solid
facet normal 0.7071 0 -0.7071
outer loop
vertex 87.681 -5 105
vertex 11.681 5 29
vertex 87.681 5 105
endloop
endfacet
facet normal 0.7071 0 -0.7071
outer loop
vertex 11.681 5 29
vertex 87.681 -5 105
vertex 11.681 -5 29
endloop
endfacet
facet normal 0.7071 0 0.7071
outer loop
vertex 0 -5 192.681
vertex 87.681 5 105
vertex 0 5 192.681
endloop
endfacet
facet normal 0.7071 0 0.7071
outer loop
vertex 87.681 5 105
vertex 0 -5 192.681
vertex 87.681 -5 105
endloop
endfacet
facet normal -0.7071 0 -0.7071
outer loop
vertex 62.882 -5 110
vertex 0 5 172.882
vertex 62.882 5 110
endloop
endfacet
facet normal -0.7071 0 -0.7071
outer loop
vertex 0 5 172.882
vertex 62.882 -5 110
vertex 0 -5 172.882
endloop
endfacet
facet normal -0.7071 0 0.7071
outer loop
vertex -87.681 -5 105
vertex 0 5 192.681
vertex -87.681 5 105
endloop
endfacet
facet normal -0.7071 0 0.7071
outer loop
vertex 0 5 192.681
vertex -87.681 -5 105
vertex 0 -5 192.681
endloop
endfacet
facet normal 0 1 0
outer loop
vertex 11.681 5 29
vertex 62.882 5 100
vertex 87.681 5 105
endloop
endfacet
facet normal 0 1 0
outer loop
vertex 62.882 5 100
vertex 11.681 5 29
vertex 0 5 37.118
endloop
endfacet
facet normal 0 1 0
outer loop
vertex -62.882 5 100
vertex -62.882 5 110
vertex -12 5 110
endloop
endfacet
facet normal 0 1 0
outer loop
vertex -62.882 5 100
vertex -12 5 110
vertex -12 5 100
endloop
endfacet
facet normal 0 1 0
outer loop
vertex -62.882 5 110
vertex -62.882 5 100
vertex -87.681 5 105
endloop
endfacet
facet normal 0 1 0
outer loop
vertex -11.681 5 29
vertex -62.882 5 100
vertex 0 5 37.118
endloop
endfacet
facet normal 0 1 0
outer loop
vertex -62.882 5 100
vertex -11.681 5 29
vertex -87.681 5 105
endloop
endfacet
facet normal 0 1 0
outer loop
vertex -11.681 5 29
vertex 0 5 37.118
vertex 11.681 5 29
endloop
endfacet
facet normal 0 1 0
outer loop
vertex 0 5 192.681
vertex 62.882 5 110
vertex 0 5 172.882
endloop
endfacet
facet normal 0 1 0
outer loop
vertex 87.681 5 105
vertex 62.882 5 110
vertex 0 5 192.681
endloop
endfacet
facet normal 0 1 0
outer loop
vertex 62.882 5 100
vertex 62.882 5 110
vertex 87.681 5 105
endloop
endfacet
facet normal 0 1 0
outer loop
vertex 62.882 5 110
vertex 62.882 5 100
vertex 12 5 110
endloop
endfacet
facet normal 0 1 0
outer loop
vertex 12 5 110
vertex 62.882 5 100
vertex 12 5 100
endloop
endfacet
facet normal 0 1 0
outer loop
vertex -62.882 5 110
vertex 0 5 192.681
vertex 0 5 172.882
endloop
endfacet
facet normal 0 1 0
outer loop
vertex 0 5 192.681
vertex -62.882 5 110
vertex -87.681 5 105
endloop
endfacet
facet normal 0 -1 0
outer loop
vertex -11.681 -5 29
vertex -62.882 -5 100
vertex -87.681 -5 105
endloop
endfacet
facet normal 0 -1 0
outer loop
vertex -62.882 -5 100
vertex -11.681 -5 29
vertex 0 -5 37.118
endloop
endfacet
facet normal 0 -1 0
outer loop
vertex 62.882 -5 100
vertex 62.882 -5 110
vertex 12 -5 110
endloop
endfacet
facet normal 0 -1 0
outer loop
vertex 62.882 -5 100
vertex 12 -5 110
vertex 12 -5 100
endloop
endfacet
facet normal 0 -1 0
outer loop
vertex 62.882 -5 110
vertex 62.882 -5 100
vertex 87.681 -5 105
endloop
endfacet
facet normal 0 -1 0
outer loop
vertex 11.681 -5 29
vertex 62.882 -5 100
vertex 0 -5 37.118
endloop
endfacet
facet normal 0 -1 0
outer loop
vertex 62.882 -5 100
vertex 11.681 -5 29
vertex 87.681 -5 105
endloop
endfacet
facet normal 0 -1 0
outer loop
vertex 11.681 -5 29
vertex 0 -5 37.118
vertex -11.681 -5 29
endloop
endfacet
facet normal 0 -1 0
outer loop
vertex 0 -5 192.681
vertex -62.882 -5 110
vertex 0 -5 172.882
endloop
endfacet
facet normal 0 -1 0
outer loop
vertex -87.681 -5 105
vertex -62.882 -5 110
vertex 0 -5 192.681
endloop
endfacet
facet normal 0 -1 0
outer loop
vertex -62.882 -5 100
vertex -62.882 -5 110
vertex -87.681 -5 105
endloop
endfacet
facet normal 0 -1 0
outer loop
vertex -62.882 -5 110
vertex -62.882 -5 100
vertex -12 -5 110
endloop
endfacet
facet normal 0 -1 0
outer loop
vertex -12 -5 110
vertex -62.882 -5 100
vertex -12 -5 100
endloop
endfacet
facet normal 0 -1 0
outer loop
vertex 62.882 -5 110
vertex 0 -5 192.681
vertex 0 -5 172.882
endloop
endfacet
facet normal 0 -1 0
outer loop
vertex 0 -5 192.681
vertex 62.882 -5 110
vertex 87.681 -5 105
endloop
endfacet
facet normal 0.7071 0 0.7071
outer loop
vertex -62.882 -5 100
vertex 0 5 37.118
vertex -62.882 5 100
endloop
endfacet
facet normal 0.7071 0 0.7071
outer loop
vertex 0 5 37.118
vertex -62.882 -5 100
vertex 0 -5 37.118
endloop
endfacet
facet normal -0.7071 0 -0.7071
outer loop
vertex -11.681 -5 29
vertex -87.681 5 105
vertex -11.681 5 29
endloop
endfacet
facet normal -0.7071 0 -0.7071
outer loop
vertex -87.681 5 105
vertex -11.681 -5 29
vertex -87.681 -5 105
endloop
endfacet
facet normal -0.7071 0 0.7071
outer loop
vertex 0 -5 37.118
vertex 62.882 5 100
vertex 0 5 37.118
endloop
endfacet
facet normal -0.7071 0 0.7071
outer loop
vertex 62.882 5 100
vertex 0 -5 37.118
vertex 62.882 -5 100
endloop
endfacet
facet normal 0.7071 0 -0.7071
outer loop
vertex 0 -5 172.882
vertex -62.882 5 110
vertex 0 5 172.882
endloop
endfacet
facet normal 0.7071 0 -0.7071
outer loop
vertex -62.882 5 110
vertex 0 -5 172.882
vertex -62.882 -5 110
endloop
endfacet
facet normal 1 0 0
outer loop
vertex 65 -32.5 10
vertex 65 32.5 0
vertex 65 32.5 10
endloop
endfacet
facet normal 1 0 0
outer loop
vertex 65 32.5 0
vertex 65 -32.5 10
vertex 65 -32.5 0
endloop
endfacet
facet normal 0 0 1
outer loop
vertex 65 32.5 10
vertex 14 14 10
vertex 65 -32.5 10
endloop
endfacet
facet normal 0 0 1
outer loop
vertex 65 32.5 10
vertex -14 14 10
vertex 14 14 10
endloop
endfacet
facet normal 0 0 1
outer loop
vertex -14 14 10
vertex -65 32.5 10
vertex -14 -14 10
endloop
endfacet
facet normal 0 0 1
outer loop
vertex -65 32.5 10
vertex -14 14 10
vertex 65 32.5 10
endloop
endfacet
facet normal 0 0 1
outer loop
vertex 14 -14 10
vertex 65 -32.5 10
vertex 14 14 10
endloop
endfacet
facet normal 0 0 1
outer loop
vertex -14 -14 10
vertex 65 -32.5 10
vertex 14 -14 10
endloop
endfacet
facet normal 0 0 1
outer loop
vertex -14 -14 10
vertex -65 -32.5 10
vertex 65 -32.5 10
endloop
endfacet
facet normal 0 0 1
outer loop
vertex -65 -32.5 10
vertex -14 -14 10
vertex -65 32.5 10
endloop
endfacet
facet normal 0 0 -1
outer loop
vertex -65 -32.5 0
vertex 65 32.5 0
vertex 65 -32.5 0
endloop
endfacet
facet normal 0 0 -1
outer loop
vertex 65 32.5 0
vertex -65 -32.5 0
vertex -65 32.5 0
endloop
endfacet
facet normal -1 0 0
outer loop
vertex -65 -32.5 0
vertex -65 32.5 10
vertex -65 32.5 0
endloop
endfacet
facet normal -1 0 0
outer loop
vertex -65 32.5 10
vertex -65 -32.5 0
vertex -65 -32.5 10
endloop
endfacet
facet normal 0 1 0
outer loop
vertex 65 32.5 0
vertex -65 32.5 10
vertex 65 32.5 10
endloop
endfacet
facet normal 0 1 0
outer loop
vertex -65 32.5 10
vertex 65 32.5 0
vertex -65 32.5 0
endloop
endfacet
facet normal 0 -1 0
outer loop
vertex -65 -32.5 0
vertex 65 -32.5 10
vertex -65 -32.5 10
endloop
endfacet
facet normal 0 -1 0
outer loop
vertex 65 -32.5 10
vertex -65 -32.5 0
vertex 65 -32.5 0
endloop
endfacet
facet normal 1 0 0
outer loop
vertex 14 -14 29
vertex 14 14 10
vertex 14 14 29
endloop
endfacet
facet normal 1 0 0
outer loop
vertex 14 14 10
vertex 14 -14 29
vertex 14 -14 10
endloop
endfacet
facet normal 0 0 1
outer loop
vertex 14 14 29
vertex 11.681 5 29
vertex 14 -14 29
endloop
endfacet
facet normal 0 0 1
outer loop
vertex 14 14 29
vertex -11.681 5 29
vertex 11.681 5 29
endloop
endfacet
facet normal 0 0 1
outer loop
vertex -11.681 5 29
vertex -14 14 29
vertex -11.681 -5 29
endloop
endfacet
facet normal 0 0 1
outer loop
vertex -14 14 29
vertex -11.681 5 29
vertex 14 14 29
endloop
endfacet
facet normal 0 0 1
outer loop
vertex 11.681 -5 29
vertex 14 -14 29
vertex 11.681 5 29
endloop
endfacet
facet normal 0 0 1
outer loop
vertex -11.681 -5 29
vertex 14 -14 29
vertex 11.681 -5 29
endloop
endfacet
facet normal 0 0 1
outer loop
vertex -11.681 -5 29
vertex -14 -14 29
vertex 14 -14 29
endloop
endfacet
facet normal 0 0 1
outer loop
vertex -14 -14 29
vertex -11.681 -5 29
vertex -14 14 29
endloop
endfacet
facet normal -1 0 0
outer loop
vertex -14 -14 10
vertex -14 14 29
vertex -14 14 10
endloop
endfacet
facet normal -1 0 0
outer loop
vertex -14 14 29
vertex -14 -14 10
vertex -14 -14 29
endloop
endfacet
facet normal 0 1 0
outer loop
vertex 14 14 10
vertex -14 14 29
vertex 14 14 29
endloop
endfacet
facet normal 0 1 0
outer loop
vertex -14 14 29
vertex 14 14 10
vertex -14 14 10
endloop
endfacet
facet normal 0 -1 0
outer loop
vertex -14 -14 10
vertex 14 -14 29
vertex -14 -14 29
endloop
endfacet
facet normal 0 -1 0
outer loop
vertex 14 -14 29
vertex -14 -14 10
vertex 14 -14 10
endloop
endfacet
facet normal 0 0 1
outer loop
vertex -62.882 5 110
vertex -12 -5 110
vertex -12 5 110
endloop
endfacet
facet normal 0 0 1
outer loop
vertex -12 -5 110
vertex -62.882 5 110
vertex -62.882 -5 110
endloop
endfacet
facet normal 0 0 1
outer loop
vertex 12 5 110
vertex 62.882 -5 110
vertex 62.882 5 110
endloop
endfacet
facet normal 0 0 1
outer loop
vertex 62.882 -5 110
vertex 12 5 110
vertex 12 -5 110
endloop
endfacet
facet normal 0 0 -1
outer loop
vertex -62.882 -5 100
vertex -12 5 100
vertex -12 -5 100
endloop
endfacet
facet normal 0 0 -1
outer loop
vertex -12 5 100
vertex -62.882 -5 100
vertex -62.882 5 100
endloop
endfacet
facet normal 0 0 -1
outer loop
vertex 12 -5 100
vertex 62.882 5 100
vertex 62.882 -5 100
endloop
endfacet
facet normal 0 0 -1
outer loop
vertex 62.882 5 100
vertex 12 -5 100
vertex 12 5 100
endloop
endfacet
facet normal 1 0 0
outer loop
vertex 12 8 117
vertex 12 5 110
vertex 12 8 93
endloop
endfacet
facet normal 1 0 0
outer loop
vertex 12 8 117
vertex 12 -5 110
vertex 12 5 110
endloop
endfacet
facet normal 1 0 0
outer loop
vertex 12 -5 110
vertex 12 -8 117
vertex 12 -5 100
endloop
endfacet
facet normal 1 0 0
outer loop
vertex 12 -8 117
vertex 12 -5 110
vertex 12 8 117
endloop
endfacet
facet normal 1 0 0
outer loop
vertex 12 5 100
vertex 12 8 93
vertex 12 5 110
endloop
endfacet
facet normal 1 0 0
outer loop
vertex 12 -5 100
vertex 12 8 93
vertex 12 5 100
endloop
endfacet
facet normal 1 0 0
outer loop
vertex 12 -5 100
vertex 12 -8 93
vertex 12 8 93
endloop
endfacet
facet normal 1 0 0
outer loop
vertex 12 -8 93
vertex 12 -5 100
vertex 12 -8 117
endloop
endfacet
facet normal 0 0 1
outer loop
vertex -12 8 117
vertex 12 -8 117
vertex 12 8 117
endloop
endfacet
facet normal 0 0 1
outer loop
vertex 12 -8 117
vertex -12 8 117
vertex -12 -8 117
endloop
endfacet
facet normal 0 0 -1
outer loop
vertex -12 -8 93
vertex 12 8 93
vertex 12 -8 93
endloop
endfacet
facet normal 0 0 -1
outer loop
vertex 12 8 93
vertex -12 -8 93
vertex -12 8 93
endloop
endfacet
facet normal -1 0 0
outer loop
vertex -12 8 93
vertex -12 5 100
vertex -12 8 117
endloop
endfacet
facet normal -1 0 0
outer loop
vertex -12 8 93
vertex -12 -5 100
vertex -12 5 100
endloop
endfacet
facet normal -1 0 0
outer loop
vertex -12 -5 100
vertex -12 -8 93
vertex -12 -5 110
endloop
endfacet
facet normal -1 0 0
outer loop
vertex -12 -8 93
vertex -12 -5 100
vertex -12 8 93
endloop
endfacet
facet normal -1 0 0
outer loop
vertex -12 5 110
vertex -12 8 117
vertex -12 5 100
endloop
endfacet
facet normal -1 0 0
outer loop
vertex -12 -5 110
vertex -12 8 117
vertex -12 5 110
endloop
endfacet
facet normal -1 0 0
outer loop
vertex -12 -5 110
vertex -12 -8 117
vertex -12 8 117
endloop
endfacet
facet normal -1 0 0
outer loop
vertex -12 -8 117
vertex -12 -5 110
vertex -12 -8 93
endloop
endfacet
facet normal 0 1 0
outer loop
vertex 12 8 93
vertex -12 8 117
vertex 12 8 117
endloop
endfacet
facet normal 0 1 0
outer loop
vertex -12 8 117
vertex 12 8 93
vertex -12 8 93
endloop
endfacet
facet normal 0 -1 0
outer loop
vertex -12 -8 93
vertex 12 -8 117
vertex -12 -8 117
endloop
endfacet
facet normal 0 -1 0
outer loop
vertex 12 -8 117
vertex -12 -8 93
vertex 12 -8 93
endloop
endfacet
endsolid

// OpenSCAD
// CONCEPTUAL RECONSTRUCTION — not the original CAD or manufacturing drawing.
// Dimensions in mm are illustrative. Verify geometry, clearances, and interfaces.
side=110; rail=14; depth=10; center_height=105;
module bar(c,s){translate(c) cube(s,center=true);}
union(){
 bar([0,0,5],[130,65,10]);
 bar([0,0,17],[28,28,24]);
 translate([0,0,center_height]) rotate([0,45,0]) {
  bar([0,0,side/2],[side+rail,depth,rail]);
  bar([0,0,-side/2],[side+rail,depth,rail]);
  bar([side/2,0,0],[rail,depth,side-rail]);
  bar([-side/2,0,0],[rail,depth,side-rail]);
 }
 bar([0,0,center_height],[156,10,10]);
 bar([0,0,center_height],[24,16,24]);
}
